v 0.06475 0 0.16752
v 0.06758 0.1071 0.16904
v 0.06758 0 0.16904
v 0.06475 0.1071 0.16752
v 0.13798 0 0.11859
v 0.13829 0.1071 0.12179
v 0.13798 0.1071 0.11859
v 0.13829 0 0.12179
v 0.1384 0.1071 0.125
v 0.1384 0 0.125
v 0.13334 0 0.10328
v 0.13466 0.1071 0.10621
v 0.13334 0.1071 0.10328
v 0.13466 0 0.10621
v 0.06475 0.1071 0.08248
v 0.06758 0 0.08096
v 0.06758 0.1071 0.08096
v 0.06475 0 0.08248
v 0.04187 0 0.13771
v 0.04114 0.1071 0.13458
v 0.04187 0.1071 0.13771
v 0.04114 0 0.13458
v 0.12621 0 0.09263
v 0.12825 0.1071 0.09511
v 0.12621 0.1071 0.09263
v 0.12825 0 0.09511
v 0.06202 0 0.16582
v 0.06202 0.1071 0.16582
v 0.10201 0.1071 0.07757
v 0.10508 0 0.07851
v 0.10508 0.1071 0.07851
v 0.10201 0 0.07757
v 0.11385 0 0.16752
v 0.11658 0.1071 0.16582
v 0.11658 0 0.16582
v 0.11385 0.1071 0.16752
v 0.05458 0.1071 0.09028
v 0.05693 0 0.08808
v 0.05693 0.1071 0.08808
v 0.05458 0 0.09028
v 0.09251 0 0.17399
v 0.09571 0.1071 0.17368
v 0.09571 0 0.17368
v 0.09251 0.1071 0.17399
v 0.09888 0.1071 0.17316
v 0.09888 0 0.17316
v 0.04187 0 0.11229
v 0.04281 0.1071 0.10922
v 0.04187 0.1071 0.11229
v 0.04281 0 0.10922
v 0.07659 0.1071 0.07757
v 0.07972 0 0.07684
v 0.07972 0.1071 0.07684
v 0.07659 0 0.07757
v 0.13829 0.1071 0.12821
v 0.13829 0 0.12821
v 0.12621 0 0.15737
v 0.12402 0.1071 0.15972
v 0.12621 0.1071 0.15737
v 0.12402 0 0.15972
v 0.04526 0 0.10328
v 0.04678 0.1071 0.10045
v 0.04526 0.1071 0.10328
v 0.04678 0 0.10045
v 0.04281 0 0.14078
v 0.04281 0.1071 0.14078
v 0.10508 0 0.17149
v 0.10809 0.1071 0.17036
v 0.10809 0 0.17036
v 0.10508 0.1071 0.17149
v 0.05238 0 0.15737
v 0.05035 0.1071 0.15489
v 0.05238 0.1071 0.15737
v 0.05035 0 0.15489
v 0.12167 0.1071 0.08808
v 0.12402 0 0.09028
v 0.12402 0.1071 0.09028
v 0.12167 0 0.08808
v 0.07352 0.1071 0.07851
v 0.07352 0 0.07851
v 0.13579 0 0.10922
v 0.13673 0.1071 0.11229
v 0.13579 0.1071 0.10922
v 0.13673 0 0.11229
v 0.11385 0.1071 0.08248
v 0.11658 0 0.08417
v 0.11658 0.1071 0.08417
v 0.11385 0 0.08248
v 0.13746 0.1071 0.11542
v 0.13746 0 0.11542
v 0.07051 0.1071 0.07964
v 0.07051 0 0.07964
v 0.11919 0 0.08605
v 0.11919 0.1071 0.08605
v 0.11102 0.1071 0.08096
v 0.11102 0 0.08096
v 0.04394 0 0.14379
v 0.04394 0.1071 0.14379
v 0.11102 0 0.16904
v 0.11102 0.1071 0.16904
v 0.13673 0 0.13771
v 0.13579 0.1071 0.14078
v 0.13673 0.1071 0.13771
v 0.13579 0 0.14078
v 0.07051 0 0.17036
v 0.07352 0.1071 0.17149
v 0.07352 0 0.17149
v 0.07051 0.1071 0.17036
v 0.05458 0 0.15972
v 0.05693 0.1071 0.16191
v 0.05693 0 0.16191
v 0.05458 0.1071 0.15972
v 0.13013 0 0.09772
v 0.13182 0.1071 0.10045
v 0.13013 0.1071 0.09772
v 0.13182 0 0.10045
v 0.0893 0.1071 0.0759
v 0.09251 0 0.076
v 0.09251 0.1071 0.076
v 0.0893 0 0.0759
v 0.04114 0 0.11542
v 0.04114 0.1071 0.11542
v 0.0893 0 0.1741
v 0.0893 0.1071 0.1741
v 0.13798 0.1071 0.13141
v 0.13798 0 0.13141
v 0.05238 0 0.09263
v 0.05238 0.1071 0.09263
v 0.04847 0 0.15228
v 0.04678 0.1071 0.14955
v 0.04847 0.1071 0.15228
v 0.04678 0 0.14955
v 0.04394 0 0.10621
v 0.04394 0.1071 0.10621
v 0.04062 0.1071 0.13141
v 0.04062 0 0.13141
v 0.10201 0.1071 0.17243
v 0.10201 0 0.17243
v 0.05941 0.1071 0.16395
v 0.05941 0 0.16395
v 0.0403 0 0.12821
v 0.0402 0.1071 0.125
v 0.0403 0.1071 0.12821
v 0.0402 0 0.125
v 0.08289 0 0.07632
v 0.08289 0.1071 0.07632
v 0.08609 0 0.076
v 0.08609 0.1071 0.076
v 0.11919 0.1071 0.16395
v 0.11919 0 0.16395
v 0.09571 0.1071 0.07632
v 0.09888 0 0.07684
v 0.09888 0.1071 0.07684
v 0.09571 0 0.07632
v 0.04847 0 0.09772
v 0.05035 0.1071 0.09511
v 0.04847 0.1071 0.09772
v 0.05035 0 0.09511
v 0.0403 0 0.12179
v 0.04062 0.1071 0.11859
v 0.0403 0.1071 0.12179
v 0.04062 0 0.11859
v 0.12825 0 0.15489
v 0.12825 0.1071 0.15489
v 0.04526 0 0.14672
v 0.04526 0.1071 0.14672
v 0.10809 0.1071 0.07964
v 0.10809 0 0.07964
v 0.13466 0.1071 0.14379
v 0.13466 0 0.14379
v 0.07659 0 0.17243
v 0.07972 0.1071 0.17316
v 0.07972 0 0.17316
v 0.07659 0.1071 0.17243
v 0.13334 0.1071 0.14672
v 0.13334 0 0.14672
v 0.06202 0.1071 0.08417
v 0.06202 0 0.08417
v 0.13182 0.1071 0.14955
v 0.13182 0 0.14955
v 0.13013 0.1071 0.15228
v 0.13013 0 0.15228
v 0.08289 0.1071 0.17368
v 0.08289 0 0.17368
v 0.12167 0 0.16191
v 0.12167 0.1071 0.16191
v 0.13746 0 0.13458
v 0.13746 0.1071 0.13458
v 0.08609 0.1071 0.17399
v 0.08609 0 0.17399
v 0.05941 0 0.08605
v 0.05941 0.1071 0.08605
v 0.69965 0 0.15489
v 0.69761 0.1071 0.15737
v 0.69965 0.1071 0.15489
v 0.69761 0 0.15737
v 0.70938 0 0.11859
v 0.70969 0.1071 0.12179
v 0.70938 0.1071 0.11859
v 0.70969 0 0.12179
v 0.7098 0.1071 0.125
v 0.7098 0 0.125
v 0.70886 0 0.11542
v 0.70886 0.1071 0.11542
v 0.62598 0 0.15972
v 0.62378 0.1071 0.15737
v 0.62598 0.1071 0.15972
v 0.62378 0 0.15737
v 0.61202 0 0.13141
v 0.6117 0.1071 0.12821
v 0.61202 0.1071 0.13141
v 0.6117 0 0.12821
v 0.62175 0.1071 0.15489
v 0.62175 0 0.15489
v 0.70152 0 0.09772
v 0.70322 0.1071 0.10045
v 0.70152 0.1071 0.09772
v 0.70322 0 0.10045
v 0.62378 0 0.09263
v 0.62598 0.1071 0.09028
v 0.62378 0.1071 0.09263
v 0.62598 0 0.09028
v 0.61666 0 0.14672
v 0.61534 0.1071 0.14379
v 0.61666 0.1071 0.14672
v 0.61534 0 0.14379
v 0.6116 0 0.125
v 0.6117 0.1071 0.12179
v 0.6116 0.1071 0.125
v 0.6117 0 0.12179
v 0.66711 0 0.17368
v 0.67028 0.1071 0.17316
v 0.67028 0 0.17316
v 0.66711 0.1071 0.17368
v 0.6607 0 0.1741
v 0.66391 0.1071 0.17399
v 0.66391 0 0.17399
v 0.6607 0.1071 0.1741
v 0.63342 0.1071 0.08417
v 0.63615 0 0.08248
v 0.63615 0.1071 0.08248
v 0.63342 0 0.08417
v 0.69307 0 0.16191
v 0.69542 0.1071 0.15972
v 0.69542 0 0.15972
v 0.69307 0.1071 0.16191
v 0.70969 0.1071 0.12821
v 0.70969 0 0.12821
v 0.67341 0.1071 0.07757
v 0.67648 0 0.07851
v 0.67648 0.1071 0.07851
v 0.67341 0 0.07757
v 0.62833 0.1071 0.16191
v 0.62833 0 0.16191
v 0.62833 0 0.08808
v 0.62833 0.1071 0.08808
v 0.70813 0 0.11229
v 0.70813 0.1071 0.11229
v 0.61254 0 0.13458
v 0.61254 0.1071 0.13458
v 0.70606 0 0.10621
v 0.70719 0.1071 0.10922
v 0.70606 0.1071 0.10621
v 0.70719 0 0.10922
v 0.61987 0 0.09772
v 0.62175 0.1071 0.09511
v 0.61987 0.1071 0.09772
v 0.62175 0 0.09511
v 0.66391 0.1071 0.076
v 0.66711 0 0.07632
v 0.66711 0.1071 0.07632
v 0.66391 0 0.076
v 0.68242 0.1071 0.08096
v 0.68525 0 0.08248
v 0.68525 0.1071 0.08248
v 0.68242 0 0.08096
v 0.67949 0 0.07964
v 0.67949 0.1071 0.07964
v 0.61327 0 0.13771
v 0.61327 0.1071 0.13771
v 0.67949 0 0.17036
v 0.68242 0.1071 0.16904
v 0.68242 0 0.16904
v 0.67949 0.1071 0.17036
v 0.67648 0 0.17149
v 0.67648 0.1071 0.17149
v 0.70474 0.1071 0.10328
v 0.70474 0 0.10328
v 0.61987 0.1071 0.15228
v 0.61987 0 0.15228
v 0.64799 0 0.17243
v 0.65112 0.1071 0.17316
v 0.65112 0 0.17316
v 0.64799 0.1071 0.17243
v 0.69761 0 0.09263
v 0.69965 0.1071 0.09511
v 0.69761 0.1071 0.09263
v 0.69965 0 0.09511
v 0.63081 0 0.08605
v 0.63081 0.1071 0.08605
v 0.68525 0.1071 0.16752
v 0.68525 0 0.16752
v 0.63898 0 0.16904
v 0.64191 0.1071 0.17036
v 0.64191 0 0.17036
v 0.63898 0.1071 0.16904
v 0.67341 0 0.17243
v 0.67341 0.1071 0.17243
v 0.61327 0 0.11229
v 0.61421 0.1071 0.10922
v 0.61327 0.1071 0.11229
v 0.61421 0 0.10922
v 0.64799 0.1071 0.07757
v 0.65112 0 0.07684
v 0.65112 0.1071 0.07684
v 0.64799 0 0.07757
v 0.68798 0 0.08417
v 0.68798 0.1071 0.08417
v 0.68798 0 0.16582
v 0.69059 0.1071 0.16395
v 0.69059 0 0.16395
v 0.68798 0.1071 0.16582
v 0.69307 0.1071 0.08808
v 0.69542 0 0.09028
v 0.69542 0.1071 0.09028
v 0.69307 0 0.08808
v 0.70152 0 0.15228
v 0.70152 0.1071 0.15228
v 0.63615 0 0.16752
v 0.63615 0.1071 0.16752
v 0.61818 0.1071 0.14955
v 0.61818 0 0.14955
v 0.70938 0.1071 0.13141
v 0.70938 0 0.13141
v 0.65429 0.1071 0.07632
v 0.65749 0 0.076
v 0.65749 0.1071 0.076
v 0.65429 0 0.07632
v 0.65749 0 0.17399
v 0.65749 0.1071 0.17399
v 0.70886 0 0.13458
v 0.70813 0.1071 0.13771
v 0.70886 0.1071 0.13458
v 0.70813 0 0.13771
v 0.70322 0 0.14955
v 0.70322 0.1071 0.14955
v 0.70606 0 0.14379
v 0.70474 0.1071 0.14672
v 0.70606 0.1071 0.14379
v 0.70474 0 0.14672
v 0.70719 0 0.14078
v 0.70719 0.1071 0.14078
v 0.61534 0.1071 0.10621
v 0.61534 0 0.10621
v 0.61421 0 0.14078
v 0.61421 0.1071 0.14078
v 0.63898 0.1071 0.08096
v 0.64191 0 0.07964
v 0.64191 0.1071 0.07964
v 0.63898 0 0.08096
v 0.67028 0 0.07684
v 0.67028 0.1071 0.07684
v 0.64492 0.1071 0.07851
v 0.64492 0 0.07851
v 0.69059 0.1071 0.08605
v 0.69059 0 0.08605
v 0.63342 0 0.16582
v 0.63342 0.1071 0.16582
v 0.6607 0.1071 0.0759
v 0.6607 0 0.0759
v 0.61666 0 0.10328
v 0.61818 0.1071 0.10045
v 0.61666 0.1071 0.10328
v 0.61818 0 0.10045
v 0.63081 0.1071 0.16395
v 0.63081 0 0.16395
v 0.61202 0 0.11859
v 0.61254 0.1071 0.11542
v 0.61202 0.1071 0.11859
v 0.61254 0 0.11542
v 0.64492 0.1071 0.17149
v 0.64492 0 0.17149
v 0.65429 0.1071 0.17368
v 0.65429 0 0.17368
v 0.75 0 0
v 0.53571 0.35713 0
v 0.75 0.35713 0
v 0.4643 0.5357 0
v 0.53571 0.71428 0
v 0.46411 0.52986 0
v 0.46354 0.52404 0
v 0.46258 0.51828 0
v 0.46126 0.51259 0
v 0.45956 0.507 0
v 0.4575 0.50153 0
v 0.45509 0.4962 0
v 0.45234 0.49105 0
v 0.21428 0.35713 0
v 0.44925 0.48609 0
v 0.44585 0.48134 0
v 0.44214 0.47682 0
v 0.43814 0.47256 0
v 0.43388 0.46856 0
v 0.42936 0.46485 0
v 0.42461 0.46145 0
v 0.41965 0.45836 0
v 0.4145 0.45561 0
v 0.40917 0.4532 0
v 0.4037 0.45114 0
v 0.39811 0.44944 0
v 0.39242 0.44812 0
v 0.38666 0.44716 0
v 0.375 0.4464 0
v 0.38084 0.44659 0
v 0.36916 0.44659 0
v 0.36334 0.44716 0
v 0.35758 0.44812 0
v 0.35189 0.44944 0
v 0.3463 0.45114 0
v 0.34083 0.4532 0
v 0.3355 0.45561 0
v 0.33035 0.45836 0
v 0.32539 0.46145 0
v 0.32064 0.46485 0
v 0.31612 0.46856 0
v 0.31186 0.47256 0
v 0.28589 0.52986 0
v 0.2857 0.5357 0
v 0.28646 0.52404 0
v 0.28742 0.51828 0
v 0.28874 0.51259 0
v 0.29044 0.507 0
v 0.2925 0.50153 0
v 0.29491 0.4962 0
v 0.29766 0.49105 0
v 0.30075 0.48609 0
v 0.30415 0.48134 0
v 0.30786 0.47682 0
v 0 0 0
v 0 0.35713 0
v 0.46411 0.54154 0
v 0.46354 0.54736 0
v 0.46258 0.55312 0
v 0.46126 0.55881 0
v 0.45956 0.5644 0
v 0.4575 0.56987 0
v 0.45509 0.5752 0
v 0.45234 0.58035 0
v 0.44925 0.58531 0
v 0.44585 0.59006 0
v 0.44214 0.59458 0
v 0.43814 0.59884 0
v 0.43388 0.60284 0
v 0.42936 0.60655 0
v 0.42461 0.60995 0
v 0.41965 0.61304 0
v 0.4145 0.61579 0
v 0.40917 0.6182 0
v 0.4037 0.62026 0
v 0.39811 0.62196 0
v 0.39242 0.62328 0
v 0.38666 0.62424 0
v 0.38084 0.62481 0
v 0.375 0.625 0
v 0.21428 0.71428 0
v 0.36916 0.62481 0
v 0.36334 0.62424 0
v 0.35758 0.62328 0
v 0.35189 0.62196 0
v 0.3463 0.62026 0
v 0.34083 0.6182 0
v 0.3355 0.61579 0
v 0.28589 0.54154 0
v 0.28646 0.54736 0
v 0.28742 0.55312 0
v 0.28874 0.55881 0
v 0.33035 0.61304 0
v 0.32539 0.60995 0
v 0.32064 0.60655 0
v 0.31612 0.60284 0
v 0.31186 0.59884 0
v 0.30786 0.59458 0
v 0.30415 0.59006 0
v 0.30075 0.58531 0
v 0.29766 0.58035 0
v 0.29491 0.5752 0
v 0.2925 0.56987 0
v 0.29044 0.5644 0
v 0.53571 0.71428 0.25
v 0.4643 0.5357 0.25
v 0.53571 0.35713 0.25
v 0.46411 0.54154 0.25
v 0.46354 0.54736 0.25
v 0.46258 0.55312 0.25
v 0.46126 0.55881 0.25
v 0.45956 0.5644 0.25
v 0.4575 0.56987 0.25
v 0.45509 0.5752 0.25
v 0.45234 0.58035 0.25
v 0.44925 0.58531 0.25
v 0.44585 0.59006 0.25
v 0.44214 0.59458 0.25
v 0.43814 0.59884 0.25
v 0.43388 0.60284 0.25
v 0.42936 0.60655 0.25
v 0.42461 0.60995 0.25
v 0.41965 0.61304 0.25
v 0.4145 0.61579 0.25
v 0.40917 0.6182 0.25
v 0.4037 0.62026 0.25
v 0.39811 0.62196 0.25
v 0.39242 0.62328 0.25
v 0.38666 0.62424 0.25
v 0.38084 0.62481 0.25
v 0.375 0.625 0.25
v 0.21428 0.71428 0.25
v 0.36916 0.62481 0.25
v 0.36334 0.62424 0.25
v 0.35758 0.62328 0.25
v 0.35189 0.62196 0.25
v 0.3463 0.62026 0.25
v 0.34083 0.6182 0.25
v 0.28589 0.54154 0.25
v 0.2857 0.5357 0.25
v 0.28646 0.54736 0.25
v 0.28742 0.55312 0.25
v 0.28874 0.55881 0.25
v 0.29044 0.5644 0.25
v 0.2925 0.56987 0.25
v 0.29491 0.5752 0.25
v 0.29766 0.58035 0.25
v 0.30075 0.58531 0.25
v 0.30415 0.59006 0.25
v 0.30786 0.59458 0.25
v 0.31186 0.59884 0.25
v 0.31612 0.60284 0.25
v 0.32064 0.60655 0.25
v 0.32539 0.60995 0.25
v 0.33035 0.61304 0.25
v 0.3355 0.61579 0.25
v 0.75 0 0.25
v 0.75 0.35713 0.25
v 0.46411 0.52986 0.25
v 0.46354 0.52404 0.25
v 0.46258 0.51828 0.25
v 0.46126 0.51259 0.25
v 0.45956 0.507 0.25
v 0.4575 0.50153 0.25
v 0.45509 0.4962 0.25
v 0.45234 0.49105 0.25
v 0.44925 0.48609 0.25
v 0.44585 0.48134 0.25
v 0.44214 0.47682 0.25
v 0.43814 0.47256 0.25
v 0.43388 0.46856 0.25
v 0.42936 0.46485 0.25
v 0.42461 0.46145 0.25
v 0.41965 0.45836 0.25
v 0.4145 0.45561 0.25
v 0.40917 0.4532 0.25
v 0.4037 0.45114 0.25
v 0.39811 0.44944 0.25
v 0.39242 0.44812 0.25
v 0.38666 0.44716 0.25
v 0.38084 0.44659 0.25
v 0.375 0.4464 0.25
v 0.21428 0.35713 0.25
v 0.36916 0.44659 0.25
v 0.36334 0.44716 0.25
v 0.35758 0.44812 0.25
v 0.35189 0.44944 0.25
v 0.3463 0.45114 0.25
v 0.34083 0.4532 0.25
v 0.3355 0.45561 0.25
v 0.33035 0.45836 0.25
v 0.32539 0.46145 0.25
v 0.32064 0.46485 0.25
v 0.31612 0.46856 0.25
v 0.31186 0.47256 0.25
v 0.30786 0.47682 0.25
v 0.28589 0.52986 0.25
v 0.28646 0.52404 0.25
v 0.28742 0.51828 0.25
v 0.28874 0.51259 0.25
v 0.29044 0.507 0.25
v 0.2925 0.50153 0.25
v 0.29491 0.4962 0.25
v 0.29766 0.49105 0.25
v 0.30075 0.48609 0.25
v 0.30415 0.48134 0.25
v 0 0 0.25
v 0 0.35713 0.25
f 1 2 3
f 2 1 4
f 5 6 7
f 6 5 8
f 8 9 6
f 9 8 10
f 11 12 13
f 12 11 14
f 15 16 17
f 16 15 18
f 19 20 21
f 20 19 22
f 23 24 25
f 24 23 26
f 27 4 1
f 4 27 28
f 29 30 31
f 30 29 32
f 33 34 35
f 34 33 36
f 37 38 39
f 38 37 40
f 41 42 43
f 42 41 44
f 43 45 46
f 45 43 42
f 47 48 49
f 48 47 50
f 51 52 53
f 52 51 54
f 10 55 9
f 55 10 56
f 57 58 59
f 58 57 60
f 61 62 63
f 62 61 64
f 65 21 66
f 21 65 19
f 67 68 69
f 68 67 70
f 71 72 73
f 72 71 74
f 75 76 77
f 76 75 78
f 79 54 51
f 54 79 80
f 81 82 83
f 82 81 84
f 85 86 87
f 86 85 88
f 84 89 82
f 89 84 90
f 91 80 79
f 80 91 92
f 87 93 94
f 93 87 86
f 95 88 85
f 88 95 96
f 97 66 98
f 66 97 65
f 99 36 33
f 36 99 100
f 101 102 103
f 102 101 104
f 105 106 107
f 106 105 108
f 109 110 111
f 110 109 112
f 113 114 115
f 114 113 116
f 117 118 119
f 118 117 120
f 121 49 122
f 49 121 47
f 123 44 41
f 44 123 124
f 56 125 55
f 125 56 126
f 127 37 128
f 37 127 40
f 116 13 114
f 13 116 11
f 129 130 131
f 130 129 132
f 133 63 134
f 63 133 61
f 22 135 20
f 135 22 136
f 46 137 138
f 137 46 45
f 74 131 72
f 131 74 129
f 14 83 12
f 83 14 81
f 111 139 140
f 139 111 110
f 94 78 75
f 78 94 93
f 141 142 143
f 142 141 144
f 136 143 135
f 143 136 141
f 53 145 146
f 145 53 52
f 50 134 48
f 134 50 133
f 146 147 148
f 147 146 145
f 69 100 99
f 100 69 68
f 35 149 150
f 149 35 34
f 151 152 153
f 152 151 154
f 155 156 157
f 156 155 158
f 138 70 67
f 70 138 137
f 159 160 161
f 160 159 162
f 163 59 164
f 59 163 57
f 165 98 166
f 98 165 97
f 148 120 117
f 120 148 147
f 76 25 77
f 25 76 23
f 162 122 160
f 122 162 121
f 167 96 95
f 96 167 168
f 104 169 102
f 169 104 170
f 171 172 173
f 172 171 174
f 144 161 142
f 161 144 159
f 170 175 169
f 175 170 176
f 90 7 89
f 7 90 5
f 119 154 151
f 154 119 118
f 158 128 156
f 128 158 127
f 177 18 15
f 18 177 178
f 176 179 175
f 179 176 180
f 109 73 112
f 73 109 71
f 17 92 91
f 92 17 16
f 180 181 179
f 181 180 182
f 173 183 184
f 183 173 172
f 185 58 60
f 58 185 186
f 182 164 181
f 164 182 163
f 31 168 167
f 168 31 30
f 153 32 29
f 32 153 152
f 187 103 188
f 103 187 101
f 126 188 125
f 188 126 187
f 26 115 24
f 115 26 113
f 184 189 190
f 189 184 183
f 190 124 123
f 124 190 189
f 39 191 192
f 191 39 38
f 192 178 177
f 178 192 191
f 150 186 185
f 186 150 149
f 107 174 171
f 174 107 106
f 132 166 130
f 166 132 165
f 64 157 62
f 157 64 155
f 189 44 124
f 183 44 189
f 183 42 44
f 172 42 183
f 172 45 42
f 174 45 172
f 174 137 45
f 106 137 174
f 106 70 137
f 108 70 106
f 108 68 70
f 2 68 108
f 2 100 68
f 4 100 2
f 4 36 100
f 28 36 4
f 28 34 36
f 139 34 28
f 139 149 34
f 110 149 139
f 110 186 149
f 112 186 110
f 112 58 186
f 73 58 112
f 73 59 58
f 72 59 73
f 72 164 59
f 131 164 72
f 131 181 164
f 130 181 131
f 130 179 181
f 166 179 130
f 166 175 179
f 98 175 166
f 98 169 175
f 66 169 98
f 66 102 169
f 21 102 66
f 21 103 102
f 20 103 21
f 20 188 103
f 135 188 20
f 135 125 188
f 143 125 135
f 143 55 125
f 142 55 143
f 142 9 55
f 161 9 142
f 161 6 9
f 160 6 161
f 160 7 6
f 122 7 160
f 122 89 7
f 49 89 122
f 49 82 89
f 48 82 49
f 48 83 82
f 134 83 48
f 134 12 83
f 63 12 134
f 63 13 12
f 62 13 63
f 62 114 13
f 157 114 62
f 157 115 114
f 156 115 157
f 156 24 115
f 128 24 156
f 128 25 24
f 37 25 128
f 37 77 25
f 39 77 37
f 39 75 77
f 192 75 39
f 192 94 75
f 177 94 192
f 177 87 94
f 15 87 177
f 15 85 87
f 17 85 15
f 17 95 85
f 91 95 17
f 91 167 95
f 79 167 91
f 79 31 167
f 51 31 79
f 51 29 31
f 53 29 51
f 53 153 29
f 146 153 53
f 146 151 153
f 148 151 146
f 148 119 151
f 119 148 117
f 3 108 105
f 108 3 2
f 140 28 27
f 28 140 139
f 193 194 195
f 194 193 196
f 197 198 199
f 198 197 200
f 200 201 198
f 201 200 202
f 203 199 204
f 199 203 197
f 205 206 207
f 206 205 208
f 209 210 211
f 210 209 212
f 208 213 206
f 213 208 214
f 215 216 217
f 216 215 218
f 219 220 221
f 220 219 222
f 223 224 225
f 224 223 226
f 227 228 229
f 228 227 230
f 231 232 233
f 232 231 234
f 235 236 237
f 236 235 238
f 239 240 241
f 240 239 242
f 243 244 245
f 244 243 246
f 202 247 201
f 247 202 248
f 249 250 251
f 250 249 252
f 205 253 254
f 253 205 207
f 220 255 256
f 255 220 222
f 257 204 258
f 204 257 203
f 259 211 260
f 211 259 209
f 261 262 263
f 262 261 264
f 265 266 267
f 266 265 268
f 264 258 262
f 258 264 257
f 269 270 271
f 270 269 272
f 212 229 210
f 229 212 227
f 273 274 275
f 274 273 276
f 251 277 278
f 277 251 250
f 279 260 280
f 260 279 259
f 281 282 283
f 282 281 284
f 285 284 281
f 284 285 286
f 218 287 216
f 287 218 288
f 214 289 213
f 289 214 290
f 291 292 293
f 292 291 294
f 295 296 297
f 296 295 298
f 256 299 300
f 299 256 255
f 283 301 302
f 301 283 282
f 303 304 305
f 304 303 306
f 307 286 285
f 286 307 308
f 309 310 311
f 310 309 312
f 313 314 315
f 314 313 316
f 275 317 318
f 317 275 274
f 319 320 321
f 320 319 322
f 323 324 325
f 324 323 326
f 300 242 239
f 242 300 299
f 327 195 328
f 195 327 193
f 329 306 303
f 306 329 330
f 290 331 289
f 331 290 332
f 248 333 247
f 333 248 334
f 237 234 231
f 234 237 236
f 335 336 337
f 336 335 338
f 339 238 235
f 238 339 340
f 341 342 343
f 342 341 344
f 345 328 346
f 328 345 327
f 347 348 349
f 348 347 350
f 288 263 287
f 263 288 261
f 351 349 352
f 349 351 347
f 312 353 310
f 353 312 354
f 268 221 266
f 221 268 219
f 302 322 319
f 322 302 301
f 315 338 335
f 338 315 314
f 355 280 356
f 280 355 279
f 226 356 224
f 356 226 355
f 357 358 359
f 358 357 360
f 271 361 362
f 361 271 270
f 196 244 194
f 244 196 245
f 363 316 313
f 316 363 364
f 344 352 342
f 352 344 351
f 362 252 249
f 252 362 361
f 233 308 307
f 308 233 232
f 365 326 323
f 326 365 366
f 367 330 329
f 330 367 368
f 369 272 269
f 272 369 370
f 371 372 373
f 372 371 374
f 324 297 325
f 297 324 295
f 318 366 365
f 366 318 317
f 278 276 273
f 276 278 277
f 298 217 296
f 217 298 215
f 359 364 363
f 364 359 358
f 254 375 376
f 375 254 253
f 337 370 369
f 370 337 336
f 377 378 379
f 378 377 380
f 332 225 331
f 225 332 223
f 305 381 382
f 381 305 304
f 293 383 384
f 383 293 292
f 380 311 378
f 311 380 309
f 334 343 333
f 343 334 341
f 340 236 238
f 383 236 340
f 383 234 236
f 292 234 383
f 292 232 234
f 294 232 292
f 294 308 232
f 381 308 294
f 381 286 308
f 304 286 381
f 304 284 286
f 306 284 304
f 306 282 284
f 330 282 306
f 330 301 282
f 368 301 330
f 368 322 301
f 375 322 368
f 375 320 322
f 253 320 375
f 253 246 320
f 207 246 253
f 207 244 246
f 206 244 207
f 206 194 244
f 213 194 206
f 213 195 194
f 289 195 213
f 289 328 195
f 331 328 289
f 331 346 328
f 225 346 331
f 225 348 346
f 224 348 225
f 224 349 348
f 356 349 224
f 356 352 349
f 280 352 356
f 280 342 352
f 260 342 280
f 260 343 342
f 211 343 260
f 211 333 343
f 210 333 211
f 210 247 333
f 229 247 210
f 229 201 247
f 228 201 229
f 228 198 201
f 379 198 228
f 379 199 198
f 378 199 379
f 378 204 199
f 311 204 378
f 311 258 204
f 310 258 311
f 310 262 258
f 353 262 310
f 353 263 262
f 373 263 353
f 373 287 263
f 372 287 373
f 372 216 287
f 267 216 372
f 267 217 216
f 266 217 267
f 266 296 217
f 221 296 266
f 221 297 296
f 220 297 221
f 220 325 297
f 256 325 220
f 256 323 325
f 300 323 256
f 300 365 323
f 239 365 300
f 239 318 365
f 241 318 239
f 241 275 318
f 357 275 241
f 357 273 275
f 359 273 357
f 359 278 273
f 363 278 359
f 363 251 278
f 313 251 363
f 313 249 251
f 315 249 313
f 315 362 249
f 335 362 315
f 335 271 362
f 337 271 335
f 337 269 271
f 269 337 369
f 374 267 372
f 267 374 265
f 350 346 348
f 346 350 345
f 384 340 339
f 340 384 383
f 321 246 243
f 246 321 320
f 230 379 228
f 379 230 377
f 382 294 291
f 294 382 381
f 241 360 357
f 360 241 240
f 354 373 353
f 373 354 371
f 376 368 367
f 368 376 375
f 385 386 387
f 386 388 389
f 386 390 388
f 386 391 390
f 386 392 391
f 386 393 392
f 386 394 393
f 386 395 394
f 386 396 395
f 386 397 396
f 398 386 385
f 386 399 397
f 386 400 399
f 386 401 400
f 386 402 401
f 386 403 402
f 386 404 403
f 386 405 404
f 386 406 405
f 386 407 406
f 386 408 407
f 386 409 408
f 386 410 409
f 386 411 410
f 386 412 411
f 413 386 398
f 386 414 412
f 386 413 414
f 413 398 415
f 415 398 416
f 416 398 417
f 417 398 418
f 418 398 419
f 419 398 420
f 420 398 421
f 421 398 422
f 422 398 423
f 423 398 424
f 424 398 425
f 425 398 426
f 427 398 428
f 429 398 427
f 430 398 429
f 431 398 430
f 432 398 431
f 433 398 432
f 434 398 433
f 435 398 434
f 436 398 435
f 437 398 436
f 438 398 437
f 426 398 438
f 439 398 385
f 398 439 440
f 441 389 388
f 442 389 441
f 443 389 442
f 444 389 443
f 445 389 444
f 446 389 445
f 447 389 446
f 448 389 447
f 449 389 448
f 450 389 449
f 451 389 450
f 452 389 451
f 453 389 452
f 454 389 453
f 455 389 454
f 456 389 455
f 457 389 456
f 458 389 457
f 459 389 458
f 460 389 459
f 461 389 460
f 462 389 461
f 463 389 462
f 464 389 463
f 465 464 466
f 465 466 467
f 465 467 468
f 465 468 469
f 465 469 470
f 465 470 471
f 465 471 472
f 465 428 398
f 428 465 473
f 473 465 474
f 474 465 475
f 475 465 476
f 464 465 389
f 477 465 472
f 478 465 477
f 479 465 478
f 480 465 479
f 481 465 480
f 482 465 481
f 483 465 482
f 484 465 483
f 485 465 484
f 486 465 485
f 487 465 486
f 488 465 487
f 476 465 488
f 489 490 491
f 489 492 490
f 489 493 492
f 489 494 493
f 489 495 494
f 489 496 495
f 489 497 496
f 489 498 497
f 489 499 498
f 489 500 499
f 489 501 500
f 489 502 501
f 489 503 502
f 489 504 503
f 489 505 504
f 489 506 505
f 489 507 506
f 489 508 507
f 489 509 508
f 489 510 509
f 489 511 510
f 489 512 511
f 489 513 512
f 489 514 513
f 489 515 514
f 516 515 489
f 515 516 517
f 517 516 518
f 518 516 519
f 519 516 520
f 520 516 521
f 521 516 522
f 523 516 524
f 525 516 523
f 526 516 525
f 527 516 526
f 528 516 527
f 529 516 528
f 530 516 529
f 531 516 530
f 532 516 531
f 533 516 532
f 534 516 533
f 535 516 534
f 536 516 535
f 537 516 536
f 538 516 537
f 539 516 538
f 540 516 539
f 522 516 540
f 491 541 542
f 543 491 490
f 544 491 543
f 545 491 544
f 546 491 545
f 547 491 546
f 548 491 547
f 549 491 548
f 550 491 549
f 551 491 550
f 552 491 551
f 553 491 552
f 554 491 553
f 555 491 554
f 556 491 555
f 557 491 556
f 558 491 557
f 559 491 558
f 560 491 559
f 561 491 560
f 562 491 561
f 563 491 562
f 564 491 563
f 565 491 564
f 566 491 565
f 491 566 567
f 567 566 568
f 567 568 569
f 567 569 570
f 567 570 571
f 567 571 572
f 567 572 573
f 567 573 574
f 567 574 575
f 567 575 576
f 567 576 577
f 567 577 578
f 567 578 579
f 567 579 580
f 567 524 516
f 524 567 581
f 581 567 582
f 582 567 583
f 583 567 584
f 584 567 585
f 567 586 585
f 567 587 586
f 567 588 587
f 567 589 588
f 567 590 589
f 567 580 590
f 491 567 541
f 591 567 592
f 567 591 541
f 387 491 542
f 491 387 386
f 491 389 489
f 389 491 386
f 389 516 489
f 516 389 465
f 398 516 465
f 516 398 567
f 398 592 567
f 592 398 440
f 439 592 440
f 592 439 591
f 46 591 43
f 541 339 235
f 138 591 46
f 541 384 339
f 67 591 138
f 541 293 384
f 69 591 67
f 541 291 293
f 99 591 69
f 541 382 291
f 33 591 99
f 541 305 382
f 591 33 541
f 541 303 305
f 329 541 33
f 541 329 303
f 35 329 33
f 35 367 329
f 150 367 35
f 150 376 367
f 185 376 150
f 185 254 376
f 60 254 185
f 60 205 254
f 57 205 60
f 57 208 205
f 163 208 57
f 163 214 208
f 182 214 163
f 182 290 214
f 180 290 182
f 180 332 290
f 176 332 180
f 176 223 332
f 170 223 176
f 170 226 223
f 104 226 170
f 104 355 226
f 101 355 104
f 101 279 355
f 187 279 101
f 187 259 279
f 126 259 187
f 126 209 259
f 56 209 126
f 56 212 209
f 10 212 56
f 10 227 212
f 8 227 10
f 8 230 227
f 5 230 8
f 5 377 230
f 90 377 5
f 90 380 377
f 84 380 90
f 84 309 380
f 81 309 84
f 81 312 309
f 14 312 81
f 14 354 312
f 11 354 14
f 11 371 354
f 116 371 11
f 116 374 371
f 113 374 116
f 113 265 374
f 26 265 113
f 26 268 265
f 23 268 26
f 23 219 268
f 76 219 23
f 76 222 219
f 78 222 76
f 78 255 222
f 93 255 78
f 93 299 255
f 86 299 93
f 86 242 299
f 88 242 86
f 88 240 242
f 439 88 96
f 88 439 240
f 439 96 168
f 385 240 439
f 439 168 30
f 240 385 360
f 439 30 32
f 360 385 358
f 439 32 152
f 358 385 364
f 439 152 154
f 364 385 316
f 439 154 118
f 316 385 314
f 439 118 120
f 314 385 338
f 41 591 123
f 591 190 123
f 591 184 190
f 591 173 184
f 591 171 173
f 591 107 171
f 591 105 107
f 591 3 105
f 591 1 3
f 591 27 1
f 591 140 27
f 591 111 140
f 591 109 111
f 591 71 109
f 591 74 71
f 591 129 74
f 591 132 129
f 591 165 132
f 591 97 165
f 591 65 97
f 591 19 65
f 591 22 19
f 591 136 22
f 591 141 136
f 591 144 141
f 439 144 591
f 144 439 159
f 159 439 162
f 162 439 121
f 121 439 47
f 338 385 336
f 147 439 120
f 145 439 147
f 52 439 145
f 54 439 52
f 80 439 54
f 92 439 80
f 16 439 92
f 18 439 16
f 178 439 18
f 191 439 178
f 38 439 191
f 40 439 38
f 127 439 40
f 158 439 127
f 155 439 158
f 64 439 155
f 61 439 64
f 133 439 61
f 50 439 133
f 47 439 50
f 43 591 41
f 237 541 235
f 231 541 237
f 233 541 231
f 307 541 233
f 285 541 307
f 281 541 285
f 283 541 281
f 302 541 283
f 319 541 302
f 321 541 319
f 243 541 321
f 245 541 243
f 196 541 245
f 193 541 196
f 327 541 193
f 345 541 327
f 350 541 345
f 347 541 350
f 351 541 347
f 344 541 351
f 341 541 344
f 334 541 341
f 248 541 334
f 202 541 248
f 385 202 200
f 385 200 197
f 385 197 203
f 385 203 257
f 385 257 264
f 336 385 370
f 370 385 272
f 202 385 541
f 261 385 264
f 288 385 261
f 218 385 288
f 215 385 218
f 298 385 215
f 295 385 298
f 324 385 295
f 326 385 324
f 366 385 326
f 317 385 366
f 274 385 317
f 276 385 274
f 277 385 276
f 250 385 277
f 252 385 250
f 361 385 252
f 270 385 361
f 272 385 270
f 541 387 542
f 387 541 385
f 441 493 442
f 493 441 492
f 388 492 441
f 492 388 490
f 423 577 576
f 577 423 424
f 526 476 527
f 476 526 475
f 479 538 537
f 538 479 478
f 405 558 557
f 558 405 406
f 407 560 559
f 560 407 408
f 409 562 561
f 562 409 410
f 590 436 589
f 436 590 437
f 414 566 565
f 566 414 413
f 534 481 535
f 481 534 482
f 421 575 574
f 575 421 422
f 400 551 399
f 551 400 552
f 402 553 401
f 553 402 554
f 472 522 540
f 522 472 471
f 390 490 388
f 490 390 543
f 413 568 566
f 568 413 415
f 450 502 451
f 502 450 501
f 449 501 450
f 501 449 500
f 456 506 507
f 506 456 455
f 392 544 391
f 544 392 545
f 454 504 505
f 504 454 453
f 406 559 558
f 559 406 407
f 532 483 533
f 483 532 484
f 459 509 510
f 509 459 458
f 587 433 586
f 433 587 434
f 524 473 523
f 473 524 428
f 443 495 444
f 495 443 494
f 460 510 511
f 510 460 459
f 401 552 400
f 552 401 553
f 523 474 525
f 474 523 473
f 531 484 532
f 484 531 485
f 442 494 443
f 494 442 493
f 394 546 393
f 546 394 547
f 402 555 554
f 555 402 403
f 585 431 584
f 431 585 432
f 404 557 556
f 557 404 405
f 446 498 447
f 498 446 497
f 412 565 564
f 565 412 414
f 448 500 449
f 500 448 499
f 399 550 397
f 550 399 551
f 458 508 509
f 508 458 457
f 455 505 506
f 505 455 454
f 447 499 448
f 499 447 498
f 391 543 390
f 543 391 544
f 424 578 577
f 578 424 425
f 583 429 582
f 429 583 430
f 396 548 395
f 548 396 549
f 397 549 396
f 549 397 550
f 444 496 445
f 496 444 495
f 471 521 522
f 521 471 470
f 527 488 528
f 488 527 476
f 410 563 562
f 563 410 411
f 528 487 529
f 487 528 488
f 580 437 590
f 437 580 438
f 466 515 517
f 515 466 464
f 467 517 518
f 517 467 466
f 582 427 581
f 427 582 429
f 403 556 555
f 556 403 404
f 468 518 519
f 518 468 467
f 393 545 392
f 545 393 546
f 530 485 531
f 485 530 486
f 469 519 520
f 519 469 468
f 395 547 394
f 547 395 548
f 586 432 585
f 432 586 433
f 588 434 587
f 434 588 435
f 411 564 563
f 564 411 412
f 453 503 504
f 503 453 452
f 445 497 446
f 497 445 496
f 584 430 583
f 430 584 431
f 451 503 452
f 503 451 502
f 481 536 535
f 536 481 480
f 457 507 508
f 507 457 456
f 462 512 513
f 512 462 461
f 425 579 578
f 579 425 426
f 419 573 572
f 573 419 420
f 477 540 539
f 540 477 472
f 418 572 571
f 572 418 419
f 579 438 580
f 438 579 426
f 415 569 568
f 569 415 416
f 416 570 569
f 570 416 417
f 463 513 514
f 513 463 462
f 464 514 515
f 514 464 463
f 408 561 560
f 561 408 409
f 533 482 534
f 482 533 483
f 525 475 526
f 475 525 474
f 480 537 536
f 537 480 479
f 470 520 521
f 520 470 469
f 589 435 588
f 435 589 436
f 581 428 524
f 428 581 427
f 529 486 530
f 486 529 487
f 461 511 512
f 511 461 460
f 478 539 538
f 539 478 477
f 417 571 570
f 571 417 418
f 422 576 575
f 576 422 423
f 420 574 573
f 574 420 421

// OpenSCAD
// Parameters
$fn = 96;

part_length = 0.75;
part_width  = 0.714286;
part_height = 0.25;

front_block_depth = 0.357143;
rear_side_inset   = 0.214286;

upper_hole_x = 0.375;
upper_hole_y = 0.5357;
upper_hole_r = 0.0893;

front_cut_x_positions = [0.0893, 0.6607];
front_cut_r     = 0.0491;
front_cut_depth = 0.1071;
front_cut_z_min = 0.0759;
front_cut_z_max = 0.1741;
front_cut_z     = (front_cut_z_min + front_cut_z_max) / 2;

eps = 0.002;

// Stepped line profile in plan view
module stepped_profile_2d() {
    polygon(points=[
        [0, 0],
        [part_length, 0],
        [part_length, front_block_depth],
        [part_length - rear_side_inset, front_block_depth],
        [part_length - rear_side_inset, part_width],
        [rear_side_inset, part_width],
        [rear_side_inset, front_block_depth],
        [0, front_block_depth]
    ]);
}

// Main extruded solid from base datum
module main_block() {
    linear_extrude(height=part_height, convexity=10)
        stepped_profile_2d();
}

// Vertical through-opening
module upper_through_hole() {
    translate([upper_hole_x, upper_hole_y, -eps])
        cylinder(h=part_height + 2*eps, r=upper_hole_r);
}

// Separate blind cylindrical cut from the front face
module front_blind_cut(xpos) {
    translate([xpos, -eps, front_cut_z])
        rotate([-90, 0, 0])
            cylinder(h=front_cut_depth + eps, r=front_cut_r);
}

// Final model
difference() {
    main_block();

    // Upper circular through-opening
    upper_through_hole();

    // Two independent front blind cylindrical removals
    for (xpos = front_cut_x_positions)
        front_blind_cut(xpos);
}
